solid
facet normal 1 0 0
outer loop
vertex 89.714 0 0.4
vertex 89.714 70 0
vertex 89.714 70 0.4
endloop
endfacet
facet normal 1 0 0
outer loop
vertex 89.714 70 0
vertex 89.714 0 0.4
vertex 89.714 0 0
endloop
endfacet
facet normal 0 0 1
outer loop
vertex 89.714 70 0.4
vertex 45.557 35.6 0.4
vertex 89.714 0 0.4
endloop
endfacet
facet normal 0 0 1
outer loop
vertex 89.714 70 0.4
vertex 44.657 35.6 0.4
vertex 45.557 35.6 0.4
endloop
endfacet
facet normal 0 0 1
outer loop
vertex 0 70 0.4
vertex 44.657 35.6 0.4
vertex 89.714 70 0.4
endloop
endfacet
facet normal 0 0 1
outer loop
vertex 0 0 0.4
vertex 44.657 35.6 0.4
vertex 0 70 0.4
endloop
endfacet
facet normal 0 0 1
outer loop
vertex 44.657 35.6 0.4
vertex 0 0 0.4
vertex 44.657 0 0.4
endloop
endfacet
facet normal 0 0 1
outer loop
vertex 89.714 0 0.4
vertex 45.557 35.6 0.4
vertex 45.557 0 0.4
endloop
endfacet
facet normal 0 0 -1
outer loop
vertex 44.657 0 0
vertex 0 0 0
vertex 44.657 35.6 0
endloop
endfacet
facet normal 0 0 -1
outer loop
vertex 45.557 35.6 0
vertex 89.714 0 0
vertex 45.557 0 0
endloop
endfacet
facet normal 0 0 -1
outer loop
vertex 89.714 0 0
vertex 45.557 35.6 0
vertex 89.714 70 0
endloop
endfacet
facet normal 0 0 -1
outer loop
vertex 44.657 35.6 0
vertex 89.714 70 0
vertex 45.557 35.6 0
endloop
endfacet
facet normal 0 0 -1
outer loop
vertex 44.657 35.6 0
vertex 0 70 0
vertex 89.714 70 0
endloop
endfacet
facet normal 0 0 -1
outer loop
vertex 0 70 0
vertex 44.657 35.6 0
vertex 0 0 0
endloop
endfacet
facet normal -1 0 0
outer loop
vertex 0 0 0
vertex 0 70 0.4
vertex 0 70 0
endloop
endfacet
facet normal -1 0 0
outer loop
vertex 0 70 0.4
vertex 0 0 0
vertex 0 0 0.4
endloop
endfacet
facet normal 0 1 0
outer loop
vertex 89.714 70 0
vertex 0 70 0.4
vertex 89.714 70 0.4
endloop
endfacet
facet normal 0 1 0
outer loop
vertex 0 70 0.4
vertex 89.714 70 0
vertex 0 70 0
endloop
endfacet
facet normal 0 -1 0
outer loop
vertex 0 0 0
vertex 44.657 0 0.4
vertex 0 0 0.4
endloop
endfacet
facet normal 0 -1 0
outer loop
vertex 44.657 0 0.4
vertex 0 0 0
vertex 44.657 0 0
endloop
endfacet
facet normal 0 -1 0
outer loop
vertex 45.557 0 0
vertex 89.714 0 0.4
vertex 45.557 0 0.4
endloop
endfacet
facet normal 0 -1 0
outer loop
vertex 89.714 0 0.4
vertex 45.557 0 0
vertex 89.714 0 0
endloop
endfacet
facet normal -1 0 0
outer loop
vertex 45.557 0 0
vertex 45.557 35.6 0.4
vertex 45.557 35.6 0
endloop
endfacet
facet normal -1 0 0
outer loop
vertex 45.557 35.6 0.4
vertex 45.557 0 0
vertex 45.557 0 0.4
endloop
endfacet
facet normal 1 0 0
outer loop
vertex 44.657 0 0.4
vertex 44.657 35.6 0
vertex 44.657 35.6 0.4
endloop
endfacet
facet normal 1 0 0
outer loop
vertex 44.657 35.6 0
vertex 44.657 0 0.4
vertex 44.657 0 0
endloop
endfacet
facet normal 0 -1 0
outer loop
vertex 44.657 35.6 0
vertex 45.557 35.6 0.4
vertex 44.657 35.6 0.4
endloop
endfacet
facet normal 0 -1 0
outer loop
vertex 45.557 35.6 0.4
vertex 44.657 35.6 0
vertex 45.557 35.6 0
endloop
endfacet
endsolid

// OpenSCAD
depth = 315;
width = 242;
height = 70;
thickness = 0.4;

cell_width = (width + thickness) / 5 - thickness;
cell_depth = (depth + thickness) / 7 - thickness;

module width_separator() {
  difference() {
    cube([width, height, thickness]);
    for (i = [0 : 5 - 2]) {
      translate([cell_width * (i + 1) + thickness * i, 0, 0])
        cube([thickness + 0.5, height / 2 + 0.6, thickness]);
    }
  }
}

module depth_separator(unit = 7) {
  assert(unit <= 7, "unit must be greater than or equal to 7");
  depth = cell_depth * unit + thickness * (unit - 1);
  difference() {
    cube([depth, height, thickness]);
    for (i = [0 : unit - 2]) {
      translate([cell_depth * (i + 1) + thickness * i, 0, 0])
        cube([thickness + 0.5, height / 2 + 0.6, thickness]);
    }
  }
}

depth_separator(2);
